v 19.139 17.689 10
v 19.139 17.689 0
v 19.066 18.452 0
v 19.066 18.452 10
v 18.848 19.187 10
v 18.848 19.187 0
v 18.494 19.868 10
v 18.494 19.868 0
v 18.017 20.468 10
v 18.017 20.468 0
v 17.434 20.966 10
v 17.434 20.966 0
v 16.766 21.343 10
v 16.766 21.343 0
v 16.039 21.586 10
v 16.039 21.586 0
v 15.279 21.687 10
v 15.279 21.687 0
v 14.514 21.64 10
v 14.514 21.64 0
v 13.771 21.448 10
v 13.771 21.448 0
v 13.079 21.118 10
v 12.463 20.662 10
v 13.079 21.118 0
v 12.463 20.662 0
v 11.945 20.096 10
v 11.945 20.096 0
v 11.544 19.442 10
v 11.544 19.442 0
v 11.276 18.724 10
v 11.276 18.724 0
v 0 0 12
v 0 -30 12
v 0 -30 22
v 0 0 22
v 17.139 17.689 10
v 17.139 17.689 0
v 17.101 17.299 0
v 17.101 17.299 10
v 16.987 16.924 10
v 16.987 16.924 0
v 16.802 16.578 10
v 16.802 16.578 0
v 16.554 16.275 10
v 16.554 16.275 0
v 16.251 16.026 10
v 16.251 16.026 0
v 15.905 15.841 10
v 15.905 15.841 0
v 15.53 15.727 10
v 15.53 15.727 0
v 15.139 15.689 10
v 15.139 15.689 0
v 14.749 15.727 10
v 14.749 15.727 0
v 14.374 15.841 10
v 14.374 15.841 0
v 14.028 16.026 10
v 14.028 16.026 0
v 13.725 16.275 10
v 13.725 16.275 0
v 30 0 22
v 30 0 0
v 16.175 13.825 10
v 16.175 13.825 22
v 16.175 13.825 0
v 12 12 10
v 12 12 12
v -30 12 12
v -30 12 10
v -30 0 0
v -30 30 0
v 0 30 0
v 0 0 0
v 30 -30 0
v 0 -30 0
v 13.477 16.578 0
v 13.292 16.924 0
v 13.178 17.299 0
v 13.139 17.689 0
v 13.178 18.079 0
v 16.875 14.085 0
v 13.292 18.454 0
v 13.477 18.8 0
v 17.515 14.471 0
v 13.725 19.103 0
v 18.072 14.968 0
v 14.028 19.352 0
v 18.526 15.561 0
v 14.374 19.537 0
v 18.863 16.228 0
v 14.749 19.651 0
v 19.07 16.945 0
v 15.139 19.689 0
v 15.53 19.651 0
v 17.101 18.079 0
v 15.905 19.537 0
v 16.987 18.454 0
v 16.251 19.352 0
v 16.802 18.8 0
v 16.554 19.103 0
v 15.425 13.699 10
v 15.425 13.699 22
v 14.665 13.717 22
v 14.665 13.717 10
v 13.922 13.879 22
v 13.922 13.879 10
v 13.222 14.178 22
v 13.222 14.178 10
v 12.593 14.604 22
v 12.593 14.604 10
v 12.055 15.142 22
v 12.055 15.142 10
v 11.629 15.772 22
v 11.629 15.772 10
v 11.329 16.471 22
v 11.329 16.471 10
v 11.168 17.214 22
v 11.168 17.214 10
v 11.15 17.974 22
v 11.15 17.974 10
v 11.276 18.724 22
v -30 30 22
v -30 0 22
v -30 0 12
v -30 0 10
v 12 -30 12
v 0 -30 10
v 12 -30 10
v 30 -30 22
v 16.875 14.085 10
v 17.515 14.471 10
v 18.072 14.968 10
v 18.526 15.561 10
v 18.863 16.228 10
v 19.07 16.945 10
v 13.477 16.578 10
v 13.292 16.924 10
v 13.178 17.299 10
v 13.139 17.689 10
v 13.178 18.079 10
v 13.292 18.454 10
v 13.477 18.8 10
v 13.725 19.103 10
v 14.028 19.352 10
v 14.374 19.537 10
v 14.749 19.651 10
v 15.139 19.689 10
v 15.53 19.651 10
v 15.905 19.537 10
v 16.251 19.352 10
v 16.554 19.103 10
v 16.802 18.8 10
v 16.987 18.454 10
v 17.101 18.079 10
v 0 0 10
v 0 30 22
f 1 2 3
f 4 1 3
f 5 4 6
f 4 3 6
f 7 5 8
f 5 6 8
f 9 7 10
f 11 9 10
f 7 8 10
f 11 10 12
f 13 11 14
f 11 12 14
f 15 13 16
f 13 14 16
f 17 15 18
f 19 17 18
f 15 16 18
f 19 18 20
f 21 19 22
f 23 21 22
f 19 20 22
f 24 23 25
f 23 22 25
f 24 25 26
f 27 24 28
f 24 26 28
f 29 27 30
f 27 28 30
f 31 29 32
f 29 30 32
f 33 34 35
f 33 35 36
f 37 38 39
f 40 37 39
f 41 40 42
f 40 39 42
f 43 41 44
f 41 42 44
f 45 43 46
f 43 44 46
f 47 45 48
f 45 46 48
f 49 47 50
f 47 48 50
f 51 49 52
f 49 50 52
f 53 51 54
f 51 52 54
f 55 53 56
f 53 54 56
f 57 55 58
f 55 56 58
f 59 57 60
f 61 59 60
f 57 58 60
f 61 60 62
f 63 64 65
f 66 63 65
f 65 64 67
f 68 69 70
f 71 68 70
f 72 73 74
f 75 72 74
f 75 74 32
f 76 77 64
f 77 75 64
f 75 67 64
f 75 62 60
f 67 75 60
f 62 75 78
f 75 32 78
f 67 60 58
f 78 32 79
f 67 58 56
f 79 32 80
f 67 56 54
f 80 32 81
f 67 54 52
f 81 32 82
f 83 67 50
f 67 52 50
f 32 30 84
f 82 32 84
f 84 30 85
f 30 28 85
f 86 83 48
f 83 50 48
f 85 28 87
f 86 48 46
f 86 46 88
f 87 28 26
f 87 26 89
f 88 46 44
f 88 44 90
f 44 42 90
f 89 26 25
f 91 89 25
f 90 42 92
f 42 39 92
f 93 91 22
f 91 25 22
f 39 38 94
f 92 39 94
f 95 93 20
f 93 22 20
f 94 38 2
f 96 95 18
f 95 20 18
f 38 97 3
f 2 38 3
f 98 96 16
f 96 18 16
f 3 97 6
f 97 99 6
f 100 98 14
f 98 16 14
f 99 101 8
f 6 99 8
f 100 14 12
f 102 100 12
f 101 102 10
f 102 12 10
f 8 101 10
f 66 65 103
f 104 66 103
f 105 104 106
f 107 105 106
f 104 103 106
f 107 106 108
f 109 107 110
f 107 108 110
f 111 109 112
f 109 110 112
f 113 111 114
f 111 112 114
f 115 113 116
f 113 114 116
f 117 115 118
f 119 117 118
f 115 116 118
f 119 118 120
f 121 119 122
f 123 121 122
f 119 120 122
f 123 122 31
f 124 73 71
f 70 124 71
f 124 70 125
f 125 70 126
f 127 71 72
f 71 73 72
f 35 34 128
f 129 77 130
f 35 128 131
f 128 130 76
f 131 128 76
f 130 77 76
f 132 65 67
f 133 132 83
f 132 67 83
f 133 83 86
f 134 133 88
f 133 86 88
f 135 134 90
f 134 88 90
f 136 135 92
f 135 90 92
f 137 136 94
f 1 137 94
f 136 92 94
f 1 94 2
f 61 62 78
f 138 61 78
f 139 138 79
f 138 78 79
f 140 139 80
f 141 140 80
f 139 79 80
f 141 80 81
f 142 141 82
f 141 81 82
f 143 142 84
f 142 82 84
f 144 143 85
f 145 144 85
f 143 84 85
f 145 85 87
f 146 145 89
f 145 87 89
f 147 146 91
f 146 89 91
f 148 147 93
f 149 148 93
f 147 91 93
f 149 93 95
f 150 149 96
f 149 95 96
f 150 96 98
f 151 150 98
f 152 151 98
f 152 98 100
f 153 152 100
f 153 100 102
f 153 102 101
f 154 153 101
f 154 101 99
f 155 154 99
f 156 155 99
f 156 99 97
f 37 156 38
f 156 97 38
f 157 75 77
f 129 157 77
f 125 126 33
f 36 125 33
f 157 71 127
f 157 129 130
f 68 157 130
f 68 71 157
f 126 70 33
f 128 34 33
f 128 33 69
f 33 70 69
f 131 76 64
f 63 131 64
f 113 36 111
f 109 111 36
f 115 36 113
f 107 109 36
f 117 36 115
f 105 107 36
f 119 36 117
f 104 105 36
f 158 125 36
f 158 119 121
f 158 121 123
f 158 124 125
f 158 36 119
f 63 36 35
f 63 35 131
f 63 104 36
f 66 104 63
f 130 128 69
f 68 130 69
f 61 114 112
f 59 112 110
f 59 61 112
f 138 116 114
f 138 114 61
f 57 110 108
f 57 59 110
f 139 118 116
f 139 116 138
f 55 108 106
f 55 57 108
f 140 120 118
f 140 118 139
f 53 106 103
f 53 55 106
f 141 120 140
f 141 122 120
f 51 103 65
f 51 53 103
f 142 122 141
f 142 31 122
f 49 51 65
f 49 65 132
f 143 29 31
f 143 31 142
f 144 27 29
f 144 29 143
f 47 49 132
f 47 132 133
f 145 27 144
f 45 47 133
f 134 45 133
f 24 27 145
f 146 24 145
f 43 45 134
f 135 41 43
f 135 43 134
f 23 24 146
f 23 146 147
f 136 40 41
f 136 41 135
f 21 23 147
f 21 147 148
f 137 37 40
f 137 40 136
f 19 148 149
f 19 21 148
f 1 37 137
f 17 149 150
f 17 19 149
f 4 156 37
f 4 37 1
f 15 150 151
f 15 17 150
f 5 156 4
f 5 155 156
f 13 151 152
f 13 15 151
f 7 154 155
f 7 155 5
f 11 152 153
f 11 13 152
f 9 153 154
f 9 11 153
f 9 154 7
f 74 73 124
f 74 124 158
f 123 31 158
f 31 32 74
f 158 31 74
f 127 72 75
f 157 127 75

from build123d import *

# Parameters (mm, degrees)
F0_W     = 30
F0_H     = 30
F1_DEPTH = 12
F2_W     = 12
F2_H     = 30
F2_H_2   = 12
F2_W_2   = 30
F3_DEPTH = 3.5
F4_W     = 30
F4_H     = 12
F4_W_2   = 12
F4_H_2   = 30
F4_H_3   = 18
F4_W_3   = 18
F5_DEPTH = 10
F6_DEPTH = 10


with BuildPart() as f1:
    # F0 (on Top) → F1 (new body)
    with BuildSketch(Plane.XY):
        with Locations((15, -15)):
            Rectangle(F0_W, F0_H)
        with BuildLine():
            Line((0, 30), (0, 0))
            Line((0, 0), (30, 0))
            Line((30, 0), (16.1747587326, 13.8252412674))
            ThreePointArc((16.1747587326, 13.8252412674), (12.3110554274, 14.8605174478), (11.275779247, 18.724220753))
            Line((11.275779247, 18.724220753), (0, 30))
        make_face()
        with Locations((-15, 15)):
            Rectangle(F0_W, F0_H)
    extrude(amount=F1_DEPTH)

    # F2 (on face) → F3 (cut)
    with BuildSketch(Plane.XY.offset(12)):
        with Locations((6, -15)):
            Rectangle(F2_W, F2_H)
        with Locations((6, 6)):
            Rectangle(F2_W, F2_H_2)
        with Locations((-15, 6)):
            Rectangle(F2_W_2, F2_H_2)
    extrude(amount=-F3_DEPTH, mode=Mode.SUBTRACT)

    # F4 (on face) → F5 (join)
    with BuildSketch(Plane.XY.offset(12)):
        with Locations((-15, 6)):
            Rectangle(F4_W, F4_H)
        with Locations((6, -15)):
            Rectangle(F4_W_2, F4_H_2)
        with BuildLine():
            Line((11.275779247, 18.724220753), (0, 30))
            Line((0, 30), (0, 12))
            Line((0, 12), (12, 12))
            Line((12, 12), (12, 0))
            Line((12, 0), (30, 0))
            Line((30, 0), (16.1747587326, 13.8252412674))
            ThreePointArc((16.1747587326, 13.8252412674), (12.3110554274, 14.8605174478), (11.275779247, 18.724220753))
        make_face()
        with Locations((6, 6)):
            Rectangle(F4_W_2, F4_H)
        with Locations((-15, 21)):
            Rectangle(F4_W, F4_H_3)
        with Locations((21, -15)):
            Rectangle(F4_W_3, F4_H_2)
    extrude(amount=F5_DEPTH)

    # F0 (on Top) → F6 (join)
    with BuildSketch(Plane.XY):
        with Locations((-15, 15)):
            Rectangle(F0_W, F0_H)
        with BuildLine():
            Line((0, 30), (0, 0))
            Line((0, 0), (30, 0))
            Line((30, 0), (16.1747587326, 13.8252412674))
            ThreePointArc((16.1747587326, 13.8252412674), (12.3110554274, 14.8605174478), (11.275779247, 18.724220753))
            Line((11.275779247, 18.724220753), (0, 30))
        make_face()
        with Locations((15, -15)):
            Rectangle(F0_W, F0_H)
        with BuildLine():
            ThreePointArc((19.1394825522, 17.6889445726), (15.6615873211, 21.6547240181), (11.275779247, 18.724220753))
            Line((11.275779247, 18.724220753), (13.7252689898, 16.2747310102))
            Line((13.7252689898, 16.2747310102), (16.1747587326, 13.8252412674))
            ThreePointArc((16.1747587326, 13.8252412674), (18.3128959133, 15.2538988565), (19.1394825522, 17.6889445726))
        make_face()
        with BuildLine():
            ThreePointArc((17.1394825522, 17.6889445726), (15.9048494169, 15.8411855075), (13.7252689898, 16.2747310102))
            ThreePointArc((13.7252689898, 16.2747310102), (14.3741156874, 19.5367036376), (17.1394825522, 17.6889445726))
        make_face(mode=Mode.SUBTRACT)
        with BuildLine():
            Line((13.7252689898, 16.2747310102), (11.275779247, 18.724220753))
            ThreePointArc((11.275779247, 18.724220753), (12.3110554274, 14.8605174478), (16.1747587326, 13.8252412674))
            Line((16.1747587326, 13.8252412674), (13.7252689898, 16.2747310102))
        make_face()
    extrude(amount=F6_DEPTH)


solid = f1.part
